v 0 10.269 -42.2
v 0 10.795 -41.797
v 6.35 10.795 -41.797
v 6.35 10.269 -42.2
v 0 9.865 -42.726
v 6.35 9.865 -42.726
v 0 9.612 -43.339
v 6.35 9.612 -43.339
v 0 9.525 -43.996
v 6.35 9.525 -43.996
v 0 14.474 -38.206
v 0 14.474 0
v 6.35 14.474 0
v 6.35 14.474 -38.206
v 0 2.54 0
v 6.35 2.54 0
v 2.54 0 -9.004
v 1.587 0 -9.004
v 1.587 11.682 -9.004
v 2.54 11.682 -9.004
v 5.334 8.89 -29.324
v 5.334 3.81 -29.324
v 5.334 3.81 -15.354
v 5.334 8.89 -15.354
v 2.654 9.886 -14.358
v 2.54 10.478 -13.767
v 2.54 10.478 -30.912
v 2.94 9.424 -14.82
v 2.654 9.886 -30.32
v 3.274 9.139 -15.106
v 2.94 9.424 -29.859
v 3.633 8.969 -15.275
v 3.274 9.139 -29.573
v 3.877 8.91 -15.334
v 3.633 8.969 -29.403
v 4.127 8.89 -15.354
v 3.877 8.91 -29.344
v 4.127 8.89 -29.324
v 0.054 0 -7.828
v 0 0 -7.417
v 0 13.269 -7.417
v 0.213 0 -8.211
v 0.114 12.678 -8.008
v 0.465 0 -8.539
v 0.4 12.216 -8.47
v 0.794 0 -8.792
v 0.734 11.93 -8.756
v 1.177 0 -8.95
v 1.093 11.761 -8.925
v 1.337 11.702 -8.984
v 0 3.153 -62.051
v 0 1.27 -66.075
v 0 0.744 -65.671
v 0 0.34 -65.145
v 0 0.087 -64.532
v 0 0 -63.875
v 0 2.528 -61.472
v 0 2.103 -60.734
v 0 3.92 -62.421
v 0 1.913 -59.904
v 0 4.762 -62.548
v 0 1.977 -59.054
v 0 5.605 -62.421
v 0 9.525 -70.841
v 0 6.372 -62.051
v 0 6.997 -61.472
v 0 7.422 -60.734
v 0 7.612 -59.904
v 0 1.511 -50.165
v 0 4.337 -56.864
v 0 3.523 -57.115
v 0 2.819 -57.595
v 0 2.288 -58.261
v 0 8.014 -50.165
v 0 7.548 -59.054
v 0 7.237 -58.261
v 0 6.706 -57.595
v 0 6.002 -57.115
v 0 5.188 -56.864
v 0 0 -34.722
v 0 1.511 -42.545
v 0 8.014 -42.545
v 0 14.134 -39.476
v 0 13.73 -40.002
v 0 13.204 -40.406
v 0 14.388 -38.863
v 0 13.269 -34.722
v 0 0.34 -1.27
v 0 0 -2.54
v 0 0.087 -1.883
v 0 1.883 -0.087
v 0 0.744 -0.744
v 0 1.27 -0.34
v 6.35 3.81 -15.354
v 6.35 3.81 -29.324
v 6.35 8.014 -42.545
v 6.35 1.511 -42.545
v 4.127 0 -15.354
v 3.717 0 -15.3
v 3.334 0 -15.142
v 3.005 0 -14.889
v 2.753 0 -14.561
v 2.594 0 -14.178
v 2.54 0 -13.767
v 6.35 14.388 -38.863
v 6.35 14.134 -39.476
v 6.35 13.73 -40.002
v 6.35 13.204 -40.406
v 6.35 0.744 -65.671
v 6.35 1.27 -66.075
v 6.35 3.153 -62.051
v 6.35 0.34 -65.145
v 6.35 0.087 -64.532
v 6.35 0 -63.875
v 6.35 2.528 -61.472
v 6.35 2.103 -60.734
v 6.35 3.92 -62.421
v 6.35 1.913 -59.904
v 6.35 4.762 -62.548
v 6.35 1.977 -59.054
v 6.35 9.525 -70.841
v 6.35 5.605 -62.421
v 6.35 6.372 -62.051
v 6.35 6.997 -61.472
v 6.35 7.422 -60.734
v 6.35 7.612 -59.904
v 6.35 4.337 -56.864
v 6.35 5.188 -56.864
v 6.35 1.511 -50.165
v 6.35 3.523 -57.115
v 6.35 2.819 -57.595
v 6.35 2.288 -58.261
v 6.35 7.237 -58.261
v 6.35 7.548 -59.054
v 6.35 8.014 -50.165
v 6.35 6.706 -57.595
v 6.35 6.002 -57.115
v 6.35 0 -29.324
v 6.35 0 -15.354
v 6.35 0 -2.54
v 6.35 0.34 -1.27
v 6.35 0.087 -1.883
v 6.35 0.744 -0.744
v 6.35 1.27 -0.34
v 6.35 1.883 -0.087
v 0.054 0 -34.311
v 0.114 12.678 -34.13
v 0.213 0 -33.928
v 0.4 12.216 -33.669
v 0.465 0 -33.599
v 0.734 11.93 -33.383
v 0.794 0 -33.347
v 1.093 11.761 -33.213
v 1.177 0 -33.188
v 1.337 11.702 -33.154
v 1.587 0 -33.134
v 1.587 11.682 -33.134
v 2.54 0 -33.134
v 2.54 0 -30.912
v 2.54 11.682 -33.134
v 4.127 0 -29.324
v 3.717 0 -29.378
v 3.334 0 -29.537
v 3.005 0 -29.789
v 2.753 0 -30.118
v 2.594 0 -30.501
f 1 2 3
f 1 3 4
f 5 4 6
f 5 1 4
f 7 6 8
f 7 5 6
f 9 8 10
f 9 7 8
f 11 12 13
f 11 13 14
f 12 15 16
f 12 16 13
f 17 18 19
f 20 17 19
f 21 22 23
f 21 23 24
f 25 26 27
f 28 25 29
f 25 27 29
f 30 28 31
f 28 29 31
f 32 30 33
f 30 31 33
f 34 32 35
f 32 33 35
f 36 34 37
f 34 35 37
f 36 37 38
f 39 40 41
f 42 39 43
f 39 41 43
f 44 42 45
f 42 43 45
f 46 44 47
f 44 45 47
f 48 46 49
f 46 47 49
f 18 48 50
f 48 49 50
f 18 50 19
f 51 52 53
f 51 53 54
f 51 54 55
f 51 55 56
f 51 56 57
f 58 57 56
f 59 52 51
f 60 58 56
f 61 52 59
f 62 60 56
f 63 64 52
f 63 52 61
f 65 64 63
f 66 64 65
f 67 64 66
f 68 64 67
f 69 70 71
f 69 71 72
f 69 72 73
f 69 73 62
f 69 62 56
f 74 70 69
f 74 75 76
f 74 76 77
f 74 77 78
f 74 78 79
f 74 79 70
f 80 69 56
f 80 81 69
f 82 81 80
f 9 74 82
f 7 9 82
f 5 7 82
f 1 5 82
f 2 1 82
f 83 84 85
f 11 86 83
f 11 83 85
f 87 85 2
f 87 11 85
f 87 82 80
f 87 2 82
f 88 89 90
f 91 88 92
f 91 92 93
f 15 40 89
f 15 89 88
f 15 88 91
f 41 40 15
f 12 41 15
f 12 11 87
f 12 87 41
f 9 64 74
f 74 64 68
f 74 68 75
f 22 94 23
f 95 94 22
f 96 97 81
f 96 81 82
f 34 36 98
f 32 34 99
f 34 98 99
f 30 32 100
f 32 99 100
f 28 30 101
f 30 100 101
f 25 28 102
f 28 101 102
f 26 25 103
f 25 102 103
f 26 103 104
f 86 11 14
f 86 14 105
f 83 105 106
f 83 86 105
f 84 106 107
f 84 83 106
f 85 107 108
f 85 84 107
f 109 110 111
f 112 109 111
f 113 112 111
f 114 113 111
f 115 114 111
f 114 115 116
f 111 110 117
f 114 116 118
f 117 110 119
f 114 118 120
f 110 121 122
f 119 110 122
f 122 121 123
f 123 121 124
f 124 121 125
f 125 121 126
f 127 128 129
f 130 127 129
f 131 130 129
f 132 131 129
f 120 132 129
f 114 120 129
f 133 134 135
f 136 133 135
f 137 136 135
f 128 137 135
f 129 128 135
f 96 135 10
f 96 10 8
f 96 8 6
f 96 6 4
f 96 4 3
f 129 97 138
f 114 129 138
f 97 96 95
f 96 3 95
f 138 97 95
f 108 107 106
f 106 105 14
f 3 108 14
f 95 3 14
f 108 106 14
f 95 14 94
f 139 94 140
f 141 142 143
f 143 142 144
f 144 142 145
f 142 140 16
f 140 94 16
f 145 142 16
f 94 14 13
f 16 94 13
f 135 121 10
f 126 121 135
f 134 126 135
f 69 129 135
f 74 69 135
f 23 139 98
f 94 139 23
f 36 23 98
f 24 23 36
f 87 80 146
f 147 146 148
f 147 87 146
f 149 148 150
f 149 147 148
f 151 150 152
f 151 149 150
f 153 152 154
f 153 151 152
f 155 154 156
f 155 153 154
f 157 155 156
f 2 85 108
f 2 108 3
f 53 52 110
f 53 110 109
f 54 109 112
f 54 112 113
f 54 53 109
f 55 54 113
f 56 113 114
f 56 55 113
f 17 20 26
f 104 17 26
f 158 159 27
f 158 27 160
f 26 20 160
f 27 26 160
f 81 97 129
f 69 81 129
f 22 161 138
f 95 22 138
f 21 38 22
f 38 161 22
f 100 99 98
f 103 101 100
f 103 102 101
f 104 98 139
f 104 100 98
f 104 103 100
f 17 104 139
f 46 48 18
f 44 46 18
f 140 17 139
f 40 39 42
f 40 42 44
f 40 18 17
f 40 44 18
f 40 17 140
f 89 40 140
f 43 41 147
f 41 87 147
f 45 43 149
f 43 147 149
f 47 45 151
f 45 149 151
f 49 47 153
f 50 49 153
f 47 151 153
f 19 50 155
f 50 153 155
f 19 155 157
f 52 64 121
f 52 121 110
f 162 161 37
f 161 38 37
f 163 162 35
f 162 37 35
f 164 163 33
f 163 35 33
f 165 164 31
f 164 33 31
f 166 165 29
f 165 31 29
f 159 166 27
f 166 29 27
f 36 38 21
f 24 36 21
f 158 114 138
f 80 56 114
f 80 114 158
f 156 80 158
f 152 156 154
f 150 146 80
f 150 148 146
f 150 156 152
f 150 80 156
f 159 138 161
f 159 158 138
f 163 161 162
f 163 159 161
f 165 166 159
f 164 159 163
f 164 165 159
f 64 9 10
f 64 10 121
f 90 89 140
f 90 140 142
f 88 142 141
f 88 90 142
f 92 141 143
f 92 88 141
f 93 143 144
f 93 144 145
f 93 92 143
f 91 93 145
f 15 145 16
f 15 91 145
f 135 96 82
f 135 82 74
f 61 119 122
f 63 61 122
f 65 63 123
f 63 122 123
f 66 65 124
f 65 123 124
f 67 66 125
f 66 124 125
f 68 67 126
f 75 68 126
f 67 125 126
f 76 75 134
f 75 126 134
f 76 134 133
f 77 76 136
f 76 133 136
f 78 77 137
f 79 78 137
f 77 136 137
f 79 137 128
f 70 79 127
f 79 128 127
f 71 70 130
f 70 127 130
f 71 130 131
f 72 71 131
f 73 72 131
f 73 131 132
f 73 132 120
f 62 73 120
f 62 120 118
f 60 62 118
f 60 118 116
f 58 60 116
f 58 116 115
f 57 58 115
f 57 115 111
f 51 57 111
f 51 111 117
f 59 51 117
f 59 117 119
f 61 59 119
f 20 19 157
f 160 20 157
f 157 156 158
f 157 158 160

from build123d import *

# Parameters (mm, degrees)
BOSS_EXTRUDE1_DEPTH = 6.35
SKETCH2_R           = 2.8575
SKETCH2_W           = 7.62
SKETCH2_H           = 6.5024
SKETCH2_W_2         = 13.97
SKETCH2_H_2         = 3.81
CUT_EXTRUDE1_DEPTH  = 7.35
SKETCH3_W           = 5.334
SKETCH3_H           = 5.08
CUT_EXTRUDE2_DEPTH  = 13.97
SKETCH4_W           = 24.13
SKETCH4_H           = 11.681664872
CUT_EXTRUDE3_DEPTH  = 2.54
FILLET1_R           = 1.5875


with BuildPart() as part:
    # Sketch1 → Boss-Extrude1 (new body)
    with BuildSketch(Plane(origin=(0, 0, 0), x_dir=(0, 0, -1), z_dir=(1, 0, 0))):
        with BuildLine():
            Line((0, 2.54), (0, 14.474335183))
            Line((0, 14.474335183), (38.205942443, 14.474335183))
            ThreePointArc((38.205942443, 14.474335183), (39.475942443, 14.134039708), (40.405646968, 13.204335183))
            Line((40.405646968, 13.204335183), (41.796677285, 10.795))
            ThreePointArc((41.796677285, 10.795), (42.72638181, 9.865295474), (43.99638181, 9.525))
            Line((43.99638181, 9.525), (70.840761314, 9.525))
            Line((70.840761314, 9.525), (66.074734842, 1.27))
            ThreePointArc((66.074734842, 1.27), (65.145030316, 0.340295474), (63.875030316, 0))
            Line((63.875030316, 0), (2.54, 0))
            ThreePointArc((2.54, 0), (0.743948776, 0.743948776), (0, 2.54))
        make_face()
    extrude(amount=BOSS_EXTRUDE1_DEPTH)

    # Sketch2 → Cut-Extrude1 (cut, through all)
    with BuildSketch(Plane(origin=(6.35, 0, 0), x_dir=(0, 0, -1), z_dir=(1, 0, 0))):
        with Locations((59.69, 4.7625)):
            Circle(SKETCH2_R)
        with Locations((46.355, 4.7625)):
            Rectangle(SKETCH2_W, SKETCH2_H)
        with Locations((22.3393, 1.905)):
            Rectangle(SKETCH2_W_2, SKETCH2_H_2)
    extrude(amount=-CUT_EXTRUDE1_DEPTH, mode=Mode.SUBTRACT)

    # Sketch3 → Cut-Extrude2 (cut)
    with BuildSketch(Plane.XY.offset(-29.3243)):
        with Locations((2.667, 6.35)):
            Rectangle(SKETCH3_W, SKETCH3_H)
    extrude(amount=CUT_EXTRUDE2_DEPTH, mode=Mode.SUBTRACT)

    # Sketch4 → Cut-Extrude3 (cut)
    with BuildSketch(Plane(origin=(0, 0, 0), x_dir=(0, 0, -1), z_dir=(1, 0, 0))):
        with Locations((21.0693, 5.840832436)):
            Rectangle(SKETCH4_W, SKETCH4_H)
    extrude(amount=CUT_EXTRUDE3_DEPTH, mode=Mode.SUBTRACT)

    # Fillet1
    fillet1_edges = [part.edges().sort_by_distance(p)[0] for p in [
        (2.54, 8.89, -22.3393),
        (2.54, 4.445, -15.3543),
        (2.54, 4.445, -29.3243),
        (0, 5.840832436, -9.0043),
        (0, 5.840832436, -33.1343),
        (0, 11.681664872, -21.0693),
    ]]
    fillet(fillet1_edges, radius=FILLET1_R)


solid = part.part
